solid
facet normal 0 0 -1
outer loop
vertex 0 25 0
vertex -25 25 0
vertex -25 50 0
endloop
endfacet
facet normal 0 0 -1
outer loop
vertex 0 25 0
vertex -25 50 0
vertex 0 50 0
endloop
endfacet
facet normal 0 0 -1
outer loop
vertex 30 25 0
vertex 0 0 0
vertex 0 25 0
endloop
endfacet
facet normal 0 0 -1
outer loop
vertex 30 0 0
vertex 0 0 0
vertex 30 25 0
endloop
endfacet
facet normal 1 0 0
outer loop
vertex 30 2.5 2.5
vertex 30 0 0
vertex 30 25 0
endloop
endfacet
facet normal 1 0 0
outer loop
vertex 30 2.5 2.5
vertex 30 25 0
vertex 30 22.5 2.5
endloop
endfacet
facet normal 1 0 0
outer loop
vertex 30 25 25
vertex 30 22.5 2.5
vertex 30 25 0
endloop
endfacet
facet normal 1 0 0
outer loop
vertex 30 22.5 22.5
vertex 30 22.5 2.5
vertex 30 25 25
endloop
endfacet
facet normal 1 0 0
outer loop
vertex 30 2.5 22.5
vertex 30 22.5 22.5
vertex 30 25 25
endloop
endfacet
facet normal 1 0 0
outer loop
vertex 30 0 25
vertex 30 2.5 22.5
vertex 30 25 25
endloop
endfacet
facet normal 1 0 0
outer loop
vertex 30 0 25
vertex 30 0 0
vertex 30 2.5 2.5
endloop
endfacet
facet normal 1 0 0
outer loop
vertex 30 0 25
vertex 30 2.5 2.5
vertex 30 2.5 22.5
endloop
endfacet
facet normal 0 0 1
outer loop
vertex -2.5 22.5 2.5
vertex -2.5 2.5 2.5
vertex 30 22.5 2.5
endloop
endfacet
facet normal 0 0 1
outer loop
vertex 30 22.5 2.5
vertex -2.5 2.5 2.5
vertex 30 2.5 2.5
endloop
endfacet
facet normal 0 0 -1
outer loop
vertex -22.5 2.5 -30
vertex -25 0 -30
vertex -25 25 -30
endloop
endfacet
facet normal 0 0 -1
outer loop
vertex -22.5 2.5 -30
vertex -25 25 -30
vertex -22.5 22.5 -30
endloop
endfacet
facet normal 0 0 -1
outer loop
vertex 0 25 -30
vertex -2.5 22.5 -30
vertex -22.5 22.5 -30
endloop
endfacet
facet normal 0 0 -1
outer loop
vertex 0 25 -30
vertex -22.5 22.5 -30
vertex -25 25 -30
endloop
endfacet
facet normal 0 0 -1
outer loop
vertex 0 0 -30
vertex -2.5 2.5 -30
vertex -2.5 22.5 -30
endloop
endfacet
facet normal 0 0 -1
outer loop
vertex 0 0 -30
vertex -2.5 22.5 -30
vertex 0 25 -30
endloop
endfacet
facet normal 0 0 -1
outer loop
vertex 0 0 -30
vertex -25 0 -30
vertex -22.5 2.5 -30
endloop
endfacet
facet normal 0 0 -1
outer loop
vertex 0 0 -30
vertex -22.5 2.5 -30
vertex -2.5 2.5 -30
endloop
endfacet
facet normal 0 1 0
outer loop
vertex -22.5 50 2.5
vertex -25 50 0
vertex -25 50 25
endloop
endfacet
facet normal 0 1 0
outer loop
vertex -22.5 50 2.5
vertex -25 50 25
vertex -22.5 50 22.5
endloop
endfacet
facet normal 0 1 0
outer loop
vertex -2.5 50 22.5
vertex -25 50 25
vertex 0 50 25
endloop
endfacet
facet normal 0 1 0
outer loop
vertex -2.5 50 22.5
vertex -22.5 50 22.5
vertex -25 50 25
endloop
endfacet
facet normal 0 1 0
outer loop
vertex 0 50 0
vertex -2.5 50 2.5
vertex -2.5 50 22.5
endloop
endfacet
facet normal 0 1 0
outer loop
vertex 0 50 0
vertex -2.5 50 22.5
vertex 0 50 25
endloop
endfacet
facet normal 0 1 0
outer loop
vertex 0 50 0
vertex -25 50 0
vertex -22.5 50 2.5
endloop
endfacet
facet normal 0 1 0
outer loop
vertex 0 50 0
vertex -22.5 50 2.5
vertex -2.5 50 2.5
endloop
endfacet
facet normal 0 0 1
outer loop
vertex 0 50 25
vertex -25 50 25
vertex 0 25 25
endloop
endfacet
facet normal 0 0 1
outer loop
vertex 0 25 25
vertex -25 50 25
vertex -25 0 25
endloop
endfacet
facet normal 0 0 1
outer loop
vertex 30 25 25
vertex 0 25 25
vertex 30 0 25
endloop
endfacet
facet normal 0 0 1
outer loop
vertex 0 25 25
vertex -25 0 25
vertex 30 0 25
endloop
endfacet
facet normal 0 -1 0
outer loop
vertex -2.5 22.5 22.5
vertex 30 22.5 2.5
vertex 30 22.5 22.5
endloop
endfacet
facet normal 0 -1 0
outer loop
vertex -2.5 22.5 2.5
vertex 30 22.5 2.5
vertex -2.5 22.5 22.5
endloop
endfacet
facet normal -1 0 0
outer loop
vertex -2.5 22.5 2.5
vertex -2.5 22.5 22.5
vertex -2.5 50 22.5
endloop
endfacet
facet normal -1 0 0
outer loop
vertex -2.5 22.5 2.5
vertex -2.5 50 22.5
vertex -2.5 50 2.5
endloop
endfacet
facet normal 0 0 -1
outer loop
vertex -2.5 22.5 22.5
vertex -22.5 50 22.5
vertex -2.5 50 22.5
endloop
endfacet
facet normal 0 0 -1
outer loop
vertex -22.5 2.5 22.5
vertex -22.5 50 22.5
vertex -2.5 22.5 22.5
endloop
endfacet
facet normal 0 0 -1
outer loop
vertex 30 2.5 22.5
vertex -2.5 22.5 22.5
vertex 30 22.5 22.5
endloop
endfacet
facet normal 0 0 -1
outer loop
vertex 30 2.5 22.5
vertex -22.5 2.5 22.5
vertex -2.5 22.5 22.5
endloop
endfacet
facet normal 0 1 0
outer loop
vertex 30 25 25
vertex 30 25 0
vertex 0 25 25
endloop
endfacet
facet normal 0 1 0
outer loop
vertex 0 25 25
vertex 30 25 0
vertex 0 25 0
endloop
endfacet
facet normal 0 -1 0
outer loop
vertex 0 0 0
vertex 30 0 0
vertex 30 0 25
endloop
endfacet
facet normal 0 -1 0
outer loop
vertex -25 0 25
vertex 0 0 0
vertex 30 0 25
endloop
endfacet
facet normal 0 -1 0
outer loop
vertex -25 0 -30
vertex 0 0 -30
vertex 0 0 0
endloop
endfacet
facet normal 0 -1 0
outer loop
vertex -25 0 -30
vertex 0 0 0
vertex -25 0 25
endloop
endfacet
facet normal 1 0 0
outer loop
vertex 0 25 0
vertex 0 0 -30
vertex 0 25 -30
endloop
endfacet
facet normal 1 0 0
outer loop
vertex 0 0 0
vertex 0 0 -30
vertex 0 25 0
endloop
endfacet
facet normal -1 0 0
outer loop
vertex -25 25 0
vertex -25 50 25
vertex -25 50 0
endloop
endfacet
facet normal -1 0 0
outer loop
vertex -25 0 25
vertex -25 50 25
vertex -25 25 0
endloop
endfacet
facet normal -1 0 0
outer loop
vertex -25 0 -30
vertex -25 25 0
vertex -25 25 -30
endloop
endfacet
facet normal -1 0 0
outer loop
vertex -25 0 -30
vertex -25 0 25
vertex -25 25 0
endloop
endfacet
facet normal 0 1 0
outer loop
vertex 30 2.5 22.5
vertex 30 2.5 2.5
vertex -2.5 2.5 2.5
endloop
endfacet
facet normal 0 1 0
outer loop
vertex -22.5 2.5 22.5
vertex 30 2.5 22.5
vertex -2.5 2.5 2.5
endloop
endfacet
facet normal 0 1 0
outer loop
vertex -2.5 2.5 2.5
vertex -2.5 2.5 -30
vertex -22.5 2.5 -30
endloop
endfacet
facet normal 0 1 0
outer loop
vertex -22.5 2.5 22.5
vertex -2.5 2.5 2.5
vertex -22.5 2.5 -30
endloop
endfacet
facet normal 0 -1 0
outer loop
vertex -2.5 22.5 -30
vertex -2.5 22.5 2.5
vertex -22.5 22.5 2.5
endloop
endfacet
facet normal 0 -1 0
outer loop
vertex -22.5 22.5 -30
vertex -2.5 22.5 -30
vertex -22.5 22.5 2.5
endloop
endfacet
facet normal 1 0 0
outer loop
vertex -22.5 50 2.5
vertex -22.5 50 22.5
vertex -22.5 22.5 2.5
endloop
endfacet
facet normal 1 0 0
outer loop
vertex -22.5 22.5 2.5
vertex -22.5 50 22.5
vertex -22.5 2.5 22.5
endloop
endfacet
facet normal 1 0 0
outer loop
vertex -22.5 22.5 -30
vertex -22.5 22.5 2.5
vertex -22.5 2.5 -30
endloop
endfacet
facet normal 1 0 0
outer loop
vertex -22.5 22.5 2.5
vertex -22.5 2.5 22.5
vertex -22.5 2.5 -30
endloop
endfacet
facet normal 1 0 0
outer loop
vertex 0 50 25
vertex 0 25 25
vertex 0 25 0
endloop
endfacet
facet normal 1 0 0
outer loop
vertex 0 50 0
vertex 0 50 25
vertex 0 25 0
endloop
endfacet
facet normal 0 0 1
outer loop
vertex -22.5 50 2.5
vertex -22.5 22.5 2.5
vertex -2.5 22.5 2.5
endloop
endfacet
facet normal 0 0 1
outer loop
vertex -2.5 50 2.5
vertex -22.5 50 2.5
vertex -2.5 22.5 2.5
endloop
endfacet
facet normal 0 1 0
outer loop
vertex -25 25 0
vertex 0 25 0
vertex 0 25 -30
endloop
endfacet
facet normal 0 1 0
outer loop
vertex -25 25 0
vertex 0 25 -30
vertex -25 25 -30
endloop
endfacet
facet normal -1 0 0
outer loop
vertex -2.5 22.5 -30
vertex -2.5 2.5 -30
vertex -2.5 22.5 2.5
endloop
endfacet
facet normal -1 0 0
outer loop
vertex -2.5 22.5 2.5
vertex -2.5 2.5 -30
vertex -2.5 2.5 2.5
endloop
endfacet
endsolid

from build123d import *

# Parameters (mm, degrees)
BOSS_EXTRUDE1_DEPTH = 25
SKETCH3_W           = 25
SKETCH3_H           = 25
BOSS_EXTRUDE2_DEPTH = 25
SHELL2_T            = -2.5


with BuildPart() as part:
    # Sketch2 → Boss-Extrude1 (new body)
    with BuildSketch(Plane(origin=(0, 0, 0), x_dir=(1, 0, 0), z_dir=(0, 1, 0))):
        Polygon((0, 0), (30, 0), (30, -25), (-25, -25), (-25, 30), (0, 30), align=None)
    extrude(amount=BOSS_EXTRUDE1_DEPTH)

    # Sketch3 → Boss-Extrude2 (add)
    with BuildSketch(Plane(origin=(0, 25, 0), x_dir=(1, 0, 0), z_dir=(0, 1, 0))):
        with Locations((-12.5, -12.5)):
            Rectangle(SKETCH3_W, SKETCH3_H)
    extrude(amount=BOSS_EXTRUDE2_DEPTH)

    # Shell2
    shell2_openings = [part.faces().sort_by_distance(p)[0] for p in [
        (30, 12.5, 12.5),
        (-12.5, 12.5, -30),
        (-12.5, 50, 12.5),
    ]]
    offset(amount=SHELL2_T, openings=shell2_openings, kind=Kind.INTERSECTION)


solid = part.part
